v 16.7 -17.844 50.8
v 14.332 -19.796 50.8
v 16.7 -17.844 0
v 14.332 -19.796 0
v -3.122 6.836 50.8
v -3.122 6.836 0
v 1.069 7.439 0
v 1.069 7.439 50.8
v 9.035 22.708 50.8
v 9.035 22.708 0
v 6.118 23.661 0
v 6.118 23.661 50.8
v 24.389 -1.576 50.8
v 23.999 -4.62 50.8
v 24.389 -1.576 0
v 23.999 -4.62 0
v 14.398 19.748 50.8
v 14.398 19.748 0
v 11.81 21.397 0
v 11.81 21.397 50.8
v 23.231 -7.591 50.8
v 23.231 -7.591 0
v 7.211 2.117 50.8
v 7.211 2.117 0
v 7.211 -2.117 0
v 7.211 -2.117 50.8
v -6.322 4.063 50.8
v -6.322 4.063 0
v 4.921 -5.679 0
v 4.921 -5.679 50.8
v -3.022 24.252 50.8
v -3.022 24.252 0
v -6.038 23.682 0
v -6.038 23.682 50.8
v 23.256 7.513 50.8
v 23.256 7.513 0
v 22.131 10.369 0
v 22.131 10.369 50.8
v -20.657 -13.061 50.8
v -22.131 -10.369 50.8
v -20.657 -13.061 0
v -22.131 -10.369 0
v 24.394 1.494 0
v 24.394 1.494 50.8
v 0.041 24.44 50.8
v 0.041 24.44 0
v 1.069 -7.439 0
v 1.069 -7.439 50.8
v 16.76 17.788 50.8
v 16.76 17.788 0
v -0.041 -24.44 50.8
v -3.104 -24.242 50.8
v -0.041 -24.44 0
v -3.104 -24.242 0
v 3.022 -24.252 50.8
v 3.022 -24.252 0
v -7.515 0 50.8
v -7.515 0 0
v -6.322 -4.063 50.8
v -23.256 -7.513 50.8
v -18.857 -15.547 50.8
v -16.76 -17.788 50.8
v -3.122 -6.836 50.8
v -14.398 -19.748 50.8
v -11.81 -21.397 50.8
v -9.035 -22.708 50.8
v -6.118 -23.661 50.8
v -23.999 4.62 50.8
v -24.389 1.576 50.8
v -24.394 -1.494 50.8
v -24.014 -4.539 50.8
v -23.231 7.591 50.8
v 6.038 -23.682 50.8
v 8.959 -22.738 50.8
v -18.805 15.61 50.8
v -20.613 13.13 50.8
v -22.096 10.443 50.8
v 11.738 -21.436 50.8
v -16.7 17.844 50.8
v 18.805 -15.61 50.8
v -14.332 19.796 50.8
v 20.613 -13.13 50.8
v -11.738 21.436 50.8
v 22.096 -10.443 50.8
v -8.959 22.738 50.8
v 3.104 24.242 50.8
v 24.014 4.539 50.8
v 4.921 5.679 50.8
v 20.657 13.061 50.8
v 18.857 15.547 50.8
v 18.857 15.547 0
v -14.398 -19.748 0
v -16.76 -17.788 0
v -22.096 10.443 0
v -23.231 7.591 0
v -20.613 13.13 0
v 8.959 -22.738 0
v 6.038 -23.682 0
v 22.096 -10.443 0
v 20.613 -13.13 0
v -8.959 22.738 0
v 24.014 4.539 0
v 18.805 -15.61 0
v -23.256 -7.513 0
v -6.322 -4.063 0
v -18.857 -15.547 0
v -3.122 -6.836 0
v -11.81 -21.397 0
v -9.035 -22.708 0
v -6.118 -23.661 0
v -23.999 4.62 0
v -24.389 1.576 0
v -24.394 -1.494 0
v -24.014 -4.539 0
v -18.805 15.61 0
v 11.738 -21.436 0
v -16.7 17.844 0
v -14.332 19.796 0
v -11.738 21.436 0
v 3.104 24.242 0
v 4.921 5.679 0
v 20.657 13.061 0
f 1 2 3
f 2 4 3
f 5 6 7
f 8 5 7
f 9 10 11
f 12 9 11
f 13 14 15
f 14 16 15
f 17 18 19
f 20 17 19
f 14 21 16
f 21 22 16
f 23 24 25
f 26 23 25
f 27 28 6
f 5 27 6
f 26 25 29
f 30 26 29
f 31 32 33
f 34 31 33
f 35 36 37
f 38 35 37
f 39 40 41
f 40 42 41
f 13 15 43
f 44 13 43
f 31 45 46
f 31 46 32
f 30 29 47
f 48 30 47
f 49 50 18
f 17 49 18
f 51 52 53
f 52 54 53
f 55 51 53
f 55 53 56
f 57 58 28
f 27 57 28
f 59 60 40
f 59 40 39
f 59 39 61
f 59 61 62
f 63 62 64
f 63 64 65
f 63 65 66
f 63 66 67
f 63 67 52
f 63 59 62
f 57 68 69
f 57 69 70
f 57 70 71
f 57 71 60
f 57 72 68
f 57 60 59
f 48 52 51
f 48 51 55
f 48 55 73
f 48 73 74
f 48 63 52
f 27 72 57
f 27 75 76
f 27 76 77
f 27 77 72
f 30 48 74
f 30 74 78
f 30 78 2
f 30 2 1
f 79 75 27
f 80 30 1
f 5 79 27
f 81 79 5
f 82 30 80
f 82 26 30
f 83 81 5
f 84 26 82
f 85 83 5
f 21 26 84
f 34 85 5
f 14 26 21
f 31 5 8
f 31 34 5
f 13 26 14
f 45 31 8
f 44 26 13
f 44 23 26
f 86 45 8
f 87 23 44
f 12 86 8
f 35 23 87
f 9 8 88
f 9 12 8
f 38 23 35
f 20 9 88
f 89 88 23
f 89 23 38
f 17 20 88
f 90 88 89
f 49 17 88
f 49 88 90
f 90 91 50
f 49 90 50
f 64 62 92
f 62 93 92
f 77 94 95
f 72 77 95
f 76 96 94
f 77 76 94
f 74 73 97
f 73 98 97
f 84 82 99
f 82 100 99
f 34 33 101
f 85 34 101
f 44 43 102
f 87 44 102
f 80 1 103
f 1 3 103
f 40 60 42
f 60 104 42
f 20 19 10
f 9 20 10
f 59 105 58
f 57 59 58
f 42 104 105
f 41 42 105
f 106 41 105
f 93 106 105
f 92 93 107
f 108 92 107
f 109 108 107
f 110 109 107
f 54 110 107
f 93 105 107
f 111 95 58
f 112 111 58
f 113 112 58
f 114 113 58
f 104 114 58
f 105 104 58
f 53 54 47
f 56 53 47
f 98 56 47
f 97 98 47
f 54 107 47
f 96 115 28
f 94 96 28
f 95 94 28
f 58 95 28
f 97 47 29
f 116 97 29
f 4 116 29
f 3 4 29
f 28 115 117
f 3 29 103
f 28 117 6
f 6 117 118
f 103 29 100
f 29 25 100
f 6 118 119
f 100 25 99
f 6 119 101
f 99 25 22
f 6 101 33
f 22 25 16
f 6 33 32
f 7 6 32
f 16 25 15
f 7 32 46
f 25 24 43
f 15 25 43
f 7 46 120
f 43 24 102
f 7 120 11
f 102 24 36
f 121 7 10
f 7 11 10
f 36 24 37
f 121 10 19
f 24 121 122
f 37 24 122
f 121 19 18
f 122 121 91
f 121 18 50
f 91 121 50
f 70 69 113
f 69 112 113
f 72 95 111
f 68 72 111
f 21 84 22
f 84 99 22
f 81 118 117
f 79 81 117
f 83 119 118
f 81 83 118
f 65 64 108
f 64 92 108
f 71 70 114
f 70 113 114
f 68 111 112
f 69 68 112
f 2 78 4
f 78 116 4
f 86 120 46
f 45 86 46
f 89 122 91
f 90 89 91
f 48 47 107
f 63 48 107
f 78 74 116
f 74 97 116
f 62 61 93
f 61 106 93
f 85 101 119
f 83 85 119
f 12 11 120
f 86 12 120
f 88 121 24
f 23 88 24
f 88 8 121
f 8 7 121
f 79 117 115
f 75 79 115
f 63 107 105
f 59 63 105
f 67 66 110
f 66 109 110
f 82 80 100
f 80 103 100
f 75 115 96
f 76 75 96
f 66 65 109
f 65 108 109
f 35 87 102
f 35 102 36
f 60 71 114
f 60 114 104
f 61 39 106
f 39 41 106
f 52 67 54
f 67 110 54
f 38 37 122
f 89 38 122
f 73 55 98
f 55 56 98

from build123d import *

# Parameters (mm, degrees)
F1_DEPTH = 25.4
F2_DEPTH = 25.4


with BuildPart() as f1:
    # F0 (on Top) → F1 (new body)
    with BuildSketch(Plane.XY):
        Polygon((20.612943, -13.130079), (22.096039, -10.443057), (23.230667, -7.591343), (23.998934, -4.619908), (24.388723, -1.575615), (24.393888, 1.493527), (24.014346, 4.539115), (23.256084, 7.513118), (22.131059, 10.368635), (20.657015, 13.060633), (18.857197, 15.546656), (16.759989, 17.7875), (14.398467, 19.747823), (11.809872, 21.396712), (9.035029, 22.708162), (6.117697, 23.661491), (3.103886, 24.241664), (0.041125, 24.439531), (-3.022285, 24.251973), (-6.038031, 23.681946), (-8.958554, 22.738441), (-11.737796, 21.436337), (-14.331925, 19.796169), (-16.700032, 17.843804), (-18.804768, 15.610031), (-20.612943, 13.130079), (-22.096039, 10.443057), (-23.230667, 7.591343), (-23.998934, 4.619908), (-24.388723, 1.575615), (-24.393888, -1.493527), (-24.014346, -4.539115), (-23.256084, -7.513118), (-22.131059, -10.368635), (-20.657015, -13.060633), (-18.857197, -15.546656), (-16.759989, -17.7875), (-14.398467, -19.747823), (-11.809872, -21.396712), (-9.035029, -22.708162), (-6.117697, -23.661491), (-3.103886, -24.241664), (-0.041125, -24.439531), (3.022285, -24.251973), (6.038031, -23.681946), (8.958554, -22.738441), (11.737796, -21.436337), (14.331925, -19.796169), (16.700032, -17.843804), (18.804768, -15.610031), align=None)
        Polygon((4.921291, 5.679472), (7.210608, 2.117225), (7.210608, -2.117225), (4.921291, -5.679472), (1.069499, -7.438527), (-3.121852, -6.835901), (-6.322036, -4.062926), (-7.515019, 0), (-6.322036, 4.062926), (-3.121852, 6.835901), (1.069499, 7.438527), align=None, mode=Mode.SUBTRACT)
    extrude(amount=F1_DEPTH)

    # F1_face (on face) → F2 (join)
    with BuildSketch(Plane.XY.offset(25.4)):
        Polygon((-23.998934, 4.619908), (-24.388723, 1.575615), (-24.393888, -1.493527), (-24.014346, -4.539115), (-23.256084, -7.513118), (-22.131059, -10.368635), (-20.657015, -13.060633), (-18.857197, -15.546656), (-16.759989, -17.7875), (-14.398467, -19.747823), (-11.809872, -21.396712), (-9.035029, -22.708162), (-6.117697, -23.661491), (-3.103886, -24.241664), (-0.041125, -24.439531), (3.022285, -24.251973), (6.038031, -23.681946), (8.958554, -22.738441), (11.737796, -21.436337), (14.331925, -19.796169), (16.700032, -17.843804), (18.804768, -15.610031), (20.612943, -13.130079), (22.096039, -10.443057), (23.230667, -7.591343), (23.998934, -4.619908), (24.388723, -1.575615), (24.393888, 1.493527), (24.014346, 4.539115), (23.256084, 7.513118), (22.131059, 10.368635), (20.657015, 13.060633), (18.857197, 15.546656), (16.759989, 17.7875), (14.398467, 19.747823), (11.809872, 21.396712), (9.035029, 22.708162), (6.117697, 23.661491), (3.103886, 24.241664), (0.041125, 24.439531), (-3.022285, 24.251973), (-6.038031, 23.681946), (-8.958554, 22.738441), (-11.737796, 21.436337), (-14.331925, 19.796169), (-16.700032, 17.843804), (-18.804768, 15.610031), (-20.612943, 13.130079), (-22.096039, 10.443057), (-23.230667, 7.591343), align=None)
        Polygon((1.069499, 7.438527), (4.921291, 5.679472), (7.210608, 2.117225), (7.210608, -2.117225), (4.921291, -5.679472), (1.069499, -7.438527), (-3.121852, -6.835901), (-6.322036, -4.062926), (-7.515019, 0), (-6.322036, 4.062926), (-3.121852, 6.835901), align=None, mode=Mode.SUBTRACT)
    extrude(amount=F2_DEPTH)


solid = f1.part
